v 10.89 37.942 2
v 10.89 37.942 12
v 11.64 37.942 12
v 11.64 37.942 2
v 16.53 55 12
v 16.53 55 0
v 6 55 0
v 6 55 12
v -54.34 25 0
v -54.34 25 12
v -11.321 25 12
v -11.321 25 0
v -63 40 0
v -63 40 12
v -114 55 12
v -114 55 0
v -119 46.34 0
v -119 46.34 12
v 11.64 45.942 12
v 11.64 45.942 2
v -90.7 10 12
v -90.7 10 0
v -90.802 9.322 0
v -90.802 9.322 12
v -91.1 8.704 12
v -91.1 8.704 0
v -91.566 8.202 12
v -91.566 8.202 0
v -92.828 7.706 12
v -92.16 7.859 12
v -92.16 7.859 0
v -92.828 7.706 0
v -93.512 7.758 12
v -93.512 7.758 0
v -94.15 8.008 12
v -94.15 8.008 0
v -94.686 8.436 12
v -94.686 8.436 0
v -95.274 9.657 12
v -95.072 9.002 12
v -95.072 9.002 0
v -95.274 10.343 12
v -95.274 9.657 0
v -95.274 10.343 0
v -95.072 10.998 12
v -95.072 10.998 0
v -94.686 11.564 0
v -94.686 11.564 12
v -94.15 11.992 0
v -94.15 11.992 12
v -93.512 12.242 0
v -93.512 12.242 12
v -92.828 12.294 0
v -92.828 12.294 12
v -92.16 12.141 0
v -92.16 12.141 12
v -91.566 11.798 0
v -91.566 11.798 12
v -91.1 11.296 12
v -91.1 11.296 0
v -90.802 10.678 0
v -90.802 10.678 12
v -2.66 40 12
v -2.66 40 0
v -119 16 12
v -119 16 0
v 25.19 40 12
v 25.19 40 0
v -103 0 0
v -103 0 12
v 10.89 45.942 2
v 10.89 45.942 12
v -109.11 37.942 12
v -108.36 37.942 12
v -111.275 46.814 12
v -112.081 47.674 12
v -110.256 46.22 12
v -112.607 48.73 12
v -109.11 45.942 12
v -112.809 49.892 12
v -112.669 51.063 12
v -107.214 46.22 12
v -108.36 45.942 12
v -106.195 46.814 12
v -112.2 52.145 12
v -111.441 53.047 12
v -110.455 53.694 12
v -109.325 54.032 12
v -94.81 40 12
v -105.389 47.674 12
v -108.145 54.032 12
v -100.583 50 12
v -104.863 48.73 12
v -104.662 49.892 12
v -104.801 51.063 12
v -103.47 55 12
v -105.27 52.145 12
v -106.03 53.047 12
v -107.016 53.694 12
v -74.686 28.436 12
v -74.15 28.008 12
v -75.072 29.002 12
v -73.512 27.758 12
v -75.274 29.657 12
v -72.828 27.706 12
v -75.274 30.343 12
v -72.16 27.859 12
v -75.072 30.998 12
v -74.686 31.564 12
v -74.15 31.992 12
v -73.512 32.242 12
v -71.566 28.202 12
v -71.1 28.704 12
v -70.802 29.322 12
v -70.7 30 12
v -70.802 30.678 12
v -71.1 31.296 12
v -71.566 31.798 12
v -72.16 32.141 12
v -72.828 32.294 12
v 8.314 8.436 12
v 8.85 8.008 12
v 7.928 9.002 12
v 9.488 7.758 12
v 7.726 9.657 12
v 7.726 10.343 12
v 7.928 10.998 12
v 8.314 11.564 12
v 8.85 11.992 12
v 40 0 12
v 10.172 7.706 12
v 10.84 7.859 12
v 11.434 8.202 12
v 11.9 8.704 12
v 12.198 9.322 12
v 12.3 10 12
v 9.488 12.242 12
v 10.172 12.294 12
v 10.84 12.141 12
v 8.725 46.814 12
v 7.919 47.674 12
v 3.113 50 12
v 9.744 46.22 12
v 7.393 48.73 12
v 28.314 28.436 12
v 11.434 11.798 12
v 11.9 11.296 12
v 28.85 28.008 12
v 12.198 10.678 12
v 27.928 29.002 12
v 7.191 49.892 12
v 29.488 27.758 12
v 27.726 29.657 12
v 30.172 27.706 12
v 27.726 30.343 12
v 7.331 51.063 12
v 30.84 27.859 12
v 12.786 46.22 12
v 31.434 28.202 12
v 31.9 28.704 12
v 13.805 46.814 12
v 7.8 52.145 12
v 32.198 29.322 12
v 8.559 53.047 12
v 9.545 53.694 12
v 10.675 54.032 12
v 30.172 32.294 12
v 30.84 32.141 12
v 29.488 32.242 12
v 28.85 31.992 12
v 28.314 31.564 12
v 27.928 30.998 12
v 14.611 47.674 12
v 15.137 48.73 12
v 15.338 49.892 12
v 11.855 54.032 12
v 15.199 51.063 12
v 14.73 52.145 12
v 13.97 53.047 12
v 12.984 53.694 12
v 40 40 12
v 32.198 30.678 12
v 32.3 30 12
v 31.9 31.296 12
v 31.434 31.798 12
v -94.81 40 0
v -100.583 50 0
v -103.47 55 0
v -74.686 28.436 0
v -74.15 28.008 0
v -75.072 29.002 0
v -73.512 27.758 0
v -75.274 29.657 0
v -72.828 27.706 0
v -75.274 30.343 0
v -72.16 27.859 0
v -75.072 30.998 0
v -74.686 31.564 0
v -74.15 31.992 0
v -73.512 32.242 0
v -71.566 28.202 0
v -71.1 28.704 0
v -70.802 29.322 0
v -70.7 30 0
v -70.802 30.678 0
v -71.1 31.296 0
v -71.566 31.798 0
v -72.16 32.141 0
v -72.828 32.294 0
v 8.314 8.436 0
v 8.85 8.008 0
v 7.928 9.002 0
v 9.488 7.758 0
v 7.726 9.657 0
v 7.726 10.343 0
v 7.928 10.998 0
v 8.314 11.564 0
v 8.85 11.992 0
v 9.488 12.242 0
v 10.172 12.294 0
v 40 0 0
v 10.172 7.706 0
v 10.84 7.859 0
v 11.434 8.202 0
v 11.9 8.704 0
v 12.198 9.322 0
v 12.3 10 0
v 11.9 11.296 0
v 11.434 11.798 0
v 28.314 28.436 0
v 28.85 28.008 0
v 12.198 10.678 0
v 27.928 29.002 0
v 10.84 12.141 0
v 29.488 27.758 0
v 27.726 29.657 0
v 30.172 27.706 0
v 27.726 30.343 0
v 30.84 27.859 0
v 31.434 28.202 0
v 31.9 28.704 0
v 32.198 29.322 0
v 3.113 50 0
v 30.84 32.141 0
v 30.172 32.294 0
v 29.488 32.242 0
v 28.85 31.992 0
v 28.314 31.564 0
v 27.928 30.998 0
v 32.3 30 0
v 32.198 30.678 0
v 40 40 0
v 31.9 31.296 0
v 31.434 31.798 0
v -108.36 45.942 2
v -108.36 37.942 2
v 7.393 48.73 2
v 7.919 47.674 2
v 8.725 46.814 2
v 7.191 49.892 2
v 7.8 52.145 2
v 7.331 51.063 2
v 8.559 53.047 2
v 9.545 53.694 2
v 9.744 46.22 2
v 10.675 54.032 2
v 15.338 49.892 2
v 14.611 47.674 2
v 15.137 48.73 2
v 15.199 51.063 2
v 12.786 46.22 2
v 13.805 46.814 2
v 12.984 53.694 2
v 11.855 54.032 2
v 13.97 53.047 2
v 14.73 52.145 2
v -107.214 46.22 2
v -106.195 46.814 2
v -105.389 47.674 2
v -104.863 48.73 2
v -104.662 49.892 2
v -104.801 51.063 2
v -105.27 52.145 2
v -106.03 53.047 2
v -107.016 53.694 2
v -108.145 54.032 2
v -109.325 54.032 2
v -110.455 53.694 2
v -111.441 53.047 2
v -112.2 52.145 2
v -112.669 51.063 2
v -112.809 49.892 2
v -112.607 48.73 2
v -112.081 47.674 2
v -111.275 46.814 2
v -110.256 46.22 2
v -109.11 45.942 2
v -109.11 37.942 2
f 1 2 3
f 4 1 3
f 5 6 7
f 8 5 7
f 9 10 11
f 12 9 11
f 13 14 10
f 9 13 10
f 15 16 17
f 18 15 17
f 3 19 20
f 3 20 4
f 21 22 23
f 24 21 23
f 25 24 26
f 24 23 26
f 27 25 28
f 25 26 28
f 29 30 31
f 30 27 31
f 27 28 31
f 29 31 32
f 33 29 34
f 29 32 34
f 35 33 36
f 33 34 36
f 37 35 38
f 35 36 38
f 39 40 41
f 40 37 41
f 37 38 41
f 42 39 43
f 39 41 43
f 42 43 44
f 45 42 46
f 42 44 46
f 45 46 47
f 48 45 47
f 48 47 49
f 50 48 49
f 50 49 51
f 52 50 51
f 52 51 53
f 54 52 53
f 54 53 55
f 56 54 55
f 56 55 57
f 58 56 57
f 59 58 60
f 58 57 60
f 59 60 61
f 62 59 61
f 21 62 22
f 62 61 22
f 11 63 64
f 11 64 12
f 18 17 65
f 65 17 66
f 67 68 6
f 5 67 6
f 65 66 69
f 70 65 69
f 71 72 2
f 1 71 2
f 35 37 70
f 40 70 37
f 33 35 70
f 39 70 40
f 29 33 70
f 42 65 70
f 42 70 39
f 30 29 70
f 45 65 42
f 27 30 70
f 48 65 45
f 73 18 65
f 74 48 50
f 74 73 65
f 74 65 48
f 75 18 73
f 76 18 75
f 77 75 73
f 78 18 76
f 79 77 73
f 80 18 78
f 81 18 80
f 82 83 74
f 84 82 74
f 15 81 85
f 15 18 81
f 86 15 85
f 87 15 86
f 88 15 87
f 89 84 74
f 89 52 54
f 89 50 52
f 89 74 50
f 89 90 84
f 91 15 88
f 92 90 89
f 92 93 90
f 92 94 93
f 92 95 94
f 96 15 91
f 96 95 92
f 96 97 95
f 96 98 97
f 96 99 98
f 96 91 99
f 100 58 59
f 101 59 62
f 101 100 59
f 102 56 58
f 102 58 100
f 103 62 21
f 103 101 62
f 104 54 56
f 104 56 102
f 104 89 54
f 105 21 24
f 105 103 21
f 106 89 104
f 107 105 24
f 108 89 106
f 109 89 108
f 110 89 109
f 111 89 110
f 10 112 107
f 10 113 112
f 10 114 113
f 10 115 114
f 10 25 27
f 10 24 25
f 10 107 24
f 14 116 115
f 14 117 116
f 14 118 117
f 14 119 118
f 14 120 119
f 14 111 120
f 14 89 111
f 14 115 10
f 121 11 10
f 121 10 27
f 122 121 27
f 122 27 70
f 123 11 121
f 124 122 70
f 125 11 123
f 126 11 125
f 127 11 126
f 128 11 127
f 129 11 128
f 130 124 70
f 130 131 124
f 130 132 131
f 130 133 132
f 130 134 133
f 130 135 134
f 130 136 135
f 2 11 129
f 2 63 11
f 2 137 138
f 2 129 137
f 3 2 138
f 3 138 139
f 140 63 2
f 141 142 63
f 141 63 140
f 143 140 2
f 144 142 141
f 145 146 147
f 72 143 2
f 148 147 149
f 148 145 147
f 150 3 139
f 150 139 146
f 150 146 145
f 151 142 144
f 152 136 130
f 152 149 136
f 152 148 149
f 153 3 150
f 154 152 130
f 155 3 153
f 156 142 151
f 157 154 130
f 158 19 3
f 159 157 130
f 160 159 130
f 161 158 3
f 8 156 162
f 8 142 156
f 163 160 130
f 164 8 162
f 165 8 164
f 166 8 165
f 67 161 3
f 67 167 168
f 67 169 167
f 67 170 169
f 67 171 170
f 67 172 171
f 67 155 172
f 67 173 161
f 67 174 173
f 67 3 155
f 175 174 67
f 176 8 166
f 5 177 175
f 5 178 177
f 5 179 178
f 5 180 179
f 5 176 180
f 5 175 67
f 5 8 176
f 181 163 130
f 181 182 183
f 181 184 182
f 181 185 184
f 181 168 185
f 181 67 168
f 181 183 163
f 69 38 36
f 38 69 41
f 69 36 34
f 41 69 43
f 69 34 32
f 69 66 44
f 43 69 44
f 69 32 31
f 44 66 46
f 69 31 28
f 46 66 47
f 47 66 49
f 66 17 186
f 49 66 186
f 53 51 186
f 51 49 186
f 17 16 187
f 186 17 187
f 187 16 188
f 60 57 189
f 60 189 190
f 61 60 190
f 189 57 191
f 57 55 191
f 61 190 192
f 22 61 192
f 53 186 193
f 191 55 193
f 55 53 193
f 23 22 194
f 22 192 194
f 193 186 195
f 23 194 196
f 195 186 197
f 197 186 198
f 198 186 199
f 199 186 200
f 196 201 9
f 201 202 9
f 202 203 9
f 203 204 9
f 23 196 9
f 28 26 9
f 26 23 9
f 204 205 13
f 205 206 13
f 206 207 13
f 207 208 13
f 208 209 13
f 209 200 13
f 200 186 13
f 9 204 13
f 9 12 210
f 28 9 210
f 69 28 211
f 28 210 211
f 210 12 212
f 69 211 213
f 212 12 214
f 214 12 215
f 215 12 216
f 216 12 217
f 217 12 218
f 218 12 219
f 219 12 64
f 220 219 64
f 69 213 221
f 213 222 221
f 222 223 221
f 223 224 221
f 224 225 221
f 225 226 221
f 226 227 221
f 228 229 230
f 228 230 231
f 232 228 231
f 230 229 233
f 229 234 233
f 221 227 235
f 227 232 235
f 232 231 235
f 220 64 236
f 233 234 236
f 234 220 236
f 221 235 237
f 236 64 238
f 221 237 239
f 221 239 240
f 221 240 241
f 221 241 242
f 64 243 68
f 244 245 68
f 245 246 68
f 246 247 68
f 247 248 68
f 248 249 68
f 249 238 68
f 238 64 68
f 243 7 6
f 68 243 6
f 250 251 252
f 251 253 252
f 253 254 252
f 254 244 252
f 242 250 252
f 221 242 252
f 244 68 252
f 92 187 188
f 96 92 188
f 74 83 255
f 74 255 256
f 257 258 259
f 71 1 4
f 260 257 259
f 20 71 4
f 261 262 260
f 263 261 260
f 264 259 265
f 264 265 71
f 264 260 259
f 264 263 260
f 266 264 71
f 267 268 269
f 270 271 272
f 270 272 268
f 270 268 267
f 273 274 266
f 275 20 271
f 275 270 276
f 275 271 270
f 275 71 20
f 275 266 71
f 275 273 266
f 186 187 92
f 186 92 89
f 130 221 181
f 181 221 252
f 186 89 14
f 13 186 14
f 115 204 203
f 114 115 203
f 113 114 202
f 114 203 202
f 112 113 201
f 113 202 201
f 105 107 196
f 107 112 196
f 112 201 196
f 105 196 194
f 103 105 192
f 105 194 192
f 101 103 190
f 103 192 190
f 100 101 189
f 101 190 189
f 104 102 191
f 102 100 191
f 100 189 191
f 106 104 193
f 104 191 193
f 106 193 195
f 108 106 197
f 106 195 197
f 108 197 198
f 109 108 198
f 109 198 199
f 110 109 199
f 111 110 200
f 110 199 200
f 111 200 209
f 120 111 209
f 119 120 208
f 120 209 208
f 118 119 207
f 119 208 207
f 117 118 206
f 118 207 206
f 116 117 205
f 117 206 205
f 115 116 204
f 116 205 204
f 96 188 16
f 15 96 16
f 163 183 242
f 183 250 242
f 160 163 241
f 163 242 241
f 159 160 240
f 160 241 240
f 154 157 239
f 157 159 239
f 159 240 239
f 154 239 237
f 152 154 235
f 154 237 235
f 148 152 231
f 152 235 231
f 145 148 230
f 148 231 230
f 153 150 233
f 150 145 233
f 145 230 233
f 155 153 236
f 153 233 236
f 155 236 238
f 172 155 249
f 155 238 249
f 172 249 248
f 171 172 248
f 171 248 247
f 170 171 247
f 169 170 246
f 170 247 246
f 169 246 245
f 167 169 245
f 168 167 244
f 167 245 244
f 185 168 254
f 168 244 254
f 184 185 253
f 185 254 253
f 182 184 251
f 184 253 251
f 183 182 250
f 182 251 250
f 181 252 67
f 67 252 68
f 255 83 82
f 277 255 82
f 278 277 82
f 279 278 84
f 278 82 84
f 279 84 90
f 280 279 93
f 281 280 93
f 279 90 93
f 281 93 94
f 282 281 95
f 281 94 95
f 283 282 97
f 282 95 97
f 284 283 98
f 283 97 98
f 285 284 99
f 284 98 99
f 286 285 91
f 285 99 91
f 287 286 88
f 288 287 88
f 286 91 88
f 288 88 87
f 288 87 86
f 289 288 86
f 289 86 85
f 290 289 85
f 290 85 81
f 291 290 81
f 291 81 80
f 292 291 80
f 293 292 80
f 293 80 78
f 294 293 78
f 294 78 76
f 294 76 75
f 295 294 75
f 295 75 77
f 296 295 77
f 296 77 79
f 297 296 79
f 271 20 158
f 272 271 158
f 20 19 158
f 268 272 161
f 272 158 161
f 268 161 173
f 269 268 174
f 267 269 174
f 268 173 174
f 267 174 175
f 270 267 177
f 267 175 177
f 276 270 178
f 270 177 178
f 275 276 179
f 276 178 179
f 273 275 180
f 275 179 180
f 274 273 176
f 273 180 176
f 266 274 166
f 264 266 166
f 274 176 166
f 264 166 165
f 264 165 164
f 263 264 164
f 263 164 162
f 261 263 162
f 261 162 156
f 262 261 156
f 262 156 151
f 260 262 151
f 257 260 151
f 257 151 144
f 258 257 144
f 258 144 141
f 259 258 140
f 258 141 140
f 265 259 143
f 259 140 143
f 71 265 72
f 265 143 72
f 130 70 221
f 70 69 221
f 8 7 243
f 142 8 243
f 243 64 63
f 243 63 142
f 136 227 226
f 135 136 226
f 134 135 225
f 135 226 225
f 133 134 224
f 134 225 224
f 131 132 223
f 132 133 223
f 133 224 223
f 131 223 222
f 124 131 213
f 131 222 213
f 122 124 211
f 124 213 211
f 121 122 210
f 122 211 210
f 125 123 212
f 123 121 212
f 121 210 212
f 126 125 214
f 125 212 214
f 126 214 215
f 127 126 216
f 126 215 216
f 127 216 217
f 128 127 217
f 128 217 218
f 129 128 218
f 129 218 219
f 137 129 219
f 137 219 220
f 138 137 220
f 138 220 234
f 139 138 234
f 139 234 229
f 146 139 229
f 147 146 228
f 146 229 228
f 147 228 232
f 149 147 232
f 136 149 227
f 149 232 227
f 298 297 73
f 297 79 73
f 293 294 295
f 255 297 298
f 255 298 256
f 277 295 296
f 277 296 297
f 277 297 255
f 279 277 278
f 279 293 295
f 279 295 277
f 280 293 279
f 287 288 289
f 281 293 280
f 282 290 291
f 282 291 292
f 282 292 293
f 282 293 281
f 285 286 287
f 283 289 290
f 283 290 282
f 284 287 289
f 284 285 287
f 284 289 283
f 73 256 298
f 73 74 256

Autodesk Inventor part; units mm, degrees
ref_plane "YZ Plane" through (0, 0, 0) normal (1, 0, 0) x (0, 1, 0)
ref_plane "XZ Plane" through (0, 0, 0) normal (0, 1, 0) x (-1, 0, 0)
ref_plane "XY Plane" through (0, 0, 0) normal (0, 0, 1) x (1, 0, 0)
sketch "rail_profile_1" plane through (0, 0, 0) normal (0, 0, 1) x (1, 0, 0)
  line L0 (6.605, 1.8) -> (6.605, 1.185) construction
  line L1 (7.1607, 6.1) -> (4.5, 3.4393) construction
  line L2 (4.5, 1.8) -> (6.605, 1.8) construction
  line L3 (4.5, 3.4393) -> (4.5, 1.8) construction
  line L4 (6.605, 1.185) -> (5.42, 0) construction
  line L5 (3.4393, 4.5) -> (6.1, 7.1607) construction
  line L6 (1.8, 4.5) -> (3.4393, 4.5) construction
  line L7 (1.8, 6.605) -> (1.8, 4.5) construction
  line L8 (5.42, 0) -> (1.5, 0) construction
  arc A0 (0, 1.5) -> (1.5, 0) centre (1.5, 1.5) ccw construction
  line L9 (0, 1.5) -> (0, 5.42) construction
  line L10 (0, 5.42) -> (1.185, 6.605) construction
  line L11 (1.185, 6.605) -> (1.8, 6.605) construction
  line L12 (0, 1.5) -> (0, 0) construction
  line L13 (0, 0) -> (1.5, 0) construction
  line L14 (3.7607, 17.3) -> (7.1607, 13.9) construction
  line L15 (1.8, 17.3) -> (3.7607, 17.3) construction
  line L16 (1.8, 22.7) -> (1.8, 17.3) construction
  line L17 (3.4393, 15.5) -> (1.8, 15.5) construction
  line L18 (1.8, 15.5) -> (1.8, 13.395) construction
  line L19 (1.8, 13.395) -> (1.185, 13.395) construction
  line L20 (6.1, 12.8393) -> (3.4393, 15.5) construction
  line L21 (1.185, 13.395) -> (0, 14.58) construction
  line L22 (0, 14.58) -> (0, 25.42) construction
  line L23 (6.1, 7.1607) -> (6.1, 9.79) construction
  line L24 (9.79, 6.1) -> (7.1607, 6.1) construction
  line L25 (6.1, 9.79) -> (6.31, 10) construction
  line L26 (10, 6.31) -> (9.79, 6.1) construction
  line L27 (6.31, 10) -> (6.1, 10.21) construction
  line L28 (10.21, 6.1) -> (10, 6.31) construction
  line L29 (6.1, 10.21) -> (6.1, 12.8393) construction
  circle A1 centre (10, 10) radius 2.3 construction
  line L30 (7.1607, 13.9) -> (12.8393, 13.9) construction
  line L31 (12.8393, 13.9) -> (13.9, 12.8393) construction
  line L32 (13.9, 12.8393) -> (13.9, 7.1607) construction
  line L33 (12.8393, 6.1) -> (10.21, 6.1) construction
  line L34 (17.3, 1.8) -> (22.7, 1.8) construction
  line L35 (17.3, 3.7607) -> (17.3, 1.8) construction
  line L36 (13.9, 7.1607) -> (17.3, 3.7607) construction
  line L37 (13.395, 1.185) -> (13.395, 1.8) construction
  line L38 (14.58, 0) -> (13.395, 1.185) construction
  line L39 (15.5, 3.4393) -> (12.8393, 6.1) construction
  line L40 (13.395, 1.8) -> (15.5, 1.8) construction
  line L41 (25.42, 0) -> (14.58, 0) construction
  line L42 (15.5, 1.8) -> (15.5, 3.4393) construction
  line L43 (0, 20) -> (51.5435, 20) construction
  line L44 (20, 0) -> (20, 50.2619) construction
  line L45 (33.395, 1.8) -> (33.395, 1.185) construction
  line L46 (32.8393, 6.1) -> (35.5, 3.4393) construction
  line L47 (35.5, 1.8) -> (33.395, 1.8) construction
  line L48 (35.5, 3.4393) -> (35.5, 1.8) construction
  line L49 (33.395, 1.185) -> (34.58, 0) construction
  line L50 (36.5607, 4.5) -> (33.9, 7.1607) construction
  line L51 (38.2, 4.5) -> (36.5607, 4.5) construction
  line L52 (38.2, 6.605) -> (38.2, 4.5) construction
  line L53 (34.58, 0) -> (38.5, 0) construction
  arc A2 (38.5, 0) -> (40, 1.5) centre (38.5, 1.5) ccw construction
  line L54 (40, 1.5) -> (40, 5.42) construction
  line L55 (38.815, 6.605) -> (38.2, 6.605) construction
  line L56 (40, 5.42) -> (38.815, 6.605) construction
  line L57 (33.9, 7.1607) -> (33.9, 9.79) construction
  line L58 (30.21, 6.1) -> (32.8393, 6.1) construction
  line L59 (33.9, 9.79) -> (33.69, 10) construction
  line L60 (30, 6.31) -> (30.21, 6.1) construction
  line L61 (33.69, 10) -> (33.9, 10.21) construction
  line L62 (29.79, 6.1) -> (30, 6.31) construction
  line L63 (33.9, 10.21) -> (33.9, 12.8393) construction
  line L64 (27.1607, 6.1) -> (29.79, 6.1) construction
  line L65 (26.1, 12.8393) -> (26.1, 7.1607) construction
  line L66 (32.8393, 13.9) -> (27.1607, 13.9) construction
  line L67 (27.1607, 13.9) -> (26.1, 12.8393) construction
  circle A3 centre (30, 10) radius 2.3 construction
  line L68 (38.2, 17.3) -> (36.2393, 17.3) construction
  line L69 (38.2, 22.7) -> (38.2, 17.3) construction
  line L70 (40, 14.58) -> (40, 25.42) construction
  line L71 (36.5607, 15.5) -> (38.2, 15.5) construction
  line L72 (38.2, 15.5) -> (38.2, 13.395) construction
  line L73 (38.2, 13.395) -> (38.815, 13.395) construction
  line L74 (38.815, 13.395) -> (40, 14.58) construction
  line L75 (22.7, 3.7607) -> (22.7, 1.8) construction
  line L76 (24.5, 1.8) -> (24.5, 3.4393) construction
  line L77 (26.605, 1.8) -> (24.5, 1.8) construction
  line L78 (26.605, 1.185) -> (26.605, 1.8) construction
  line L79 (25.42, 0) -> (26.605, 1.185) construction
  line L80 (24.5, 3.4393) -> (27.1607, 6.1) construction
  line L81 (26.1, 7.1607) -> (22.7, 3.7607) construction
  line L82 (33.9, 12.8393) -> (36.5607, 15.5) construction
  line L83 (36.2393, 17.3) -> (32.8393, 13.9) construction
  line L84 (6.605, 38.2) -> (6.605, 38.815) construction
  line L85 (7.1607, 33.9) -> (4.5, 36.5607) construction
  line L86 (4.5, 38.2) -> (6.605, 38.2) construction
  line L87 (4.5, 36.5607) -> (4.5, 38.2) construction
  line L88 (6.605, 38.815) -> (5.42, 40) construction
  line L89 (3.4393, 35.5) -> (6.1, 32.8393) construction
  line L90 (1.8, 35.5) -> (3.4393, 35.5) construction
  line L91 (1.8, 33.395) -> (1.8, 35.5) construction
  line L92 (5.42, 40) -> (1.5, 40) construction
  arc A4 (1.5, 40) -> (0, 38.5) centre (1.5, 38.5) ccw construction
  line L93 (0, 38.5) -> (0, 34.58) construction
  line L94 (1.185, 33.395) -> (1.8, 33.395) construction
  line L95 (0, 34.58) -> (1.185, 33.395) construction
  line L96 (6.1, 32.8393) -> (6.1, 30.21) construction
  line L97 (9.79, 33.9) -> (7.1607, 33.9) construction
  line L98 (6.1, 30.21) -> (6.31, 30) construction
  line L99 (10, 33.69) -> (9.79, 33.9) construction
  line L100 (6.31, 30) -> (6.1, 29.79) construction
  line L101 (10.21, 33.9) -> (10, 33.69) construction
  line L102 (6.1, 29.79) -> (6.1, 27.1607) construction
  line L103 (12.8393, 33.9) -> (10.21, 33.9) construction
  line L104 (13.9, 27.1607) -> (13.9, 32.8393) construction
  line L105 (7.1607, 26.1) -> (12.8393, 26.1) construction
  line L106 (12.8393, 26.1) -> (13.9, 27.1607) construction
  circle A5 centre (10, 30) radius 2.3 construction
  line L107 (1.8, 22.7) -> (3.7607, 22.7) construction
  line L108 (3.4393, 24.5) -> (1.8, 24.5) construction
  line L109 (1.8, 24.5) -> (1.8, 26.605) construction
  line L110 (1.8, 26.605) -> (1.185, 26.605) construction
  line L111 (1.185, 26.605) -> (0, 25.42) construction
  line L112 (17.3, 36.2393) -> (17.3, 38.2) construction
  line L113 (17.3, 38.2) -> (22.7, 38.2) construction
  line L114 (15.5, 38.2) -> (15.5, 36.5607) construction
  line L115 (13.395, 38.2) -> (15.5, 38.2) construction
  line L116 (13.395, 38.815) -> (13.395, 38.2) construction
  line L117 (14.58, 40) -> (13.395, 38.815) construction
  line L118 (25.42, 40) -> (14.58, 40) construction
  line L119 (15.5, 36.5607) -> (12.8393, 33.9) construction
  line L120 (13.9, 32.8393) -> (17.3, 36.2393) construction
  line L121 (6.1, 27.1607) -> (3.4393, 24.5) construction
  line L122 (3.7607, 22.7) -> (7.1607, 26.1) construction
  line L123 (38.815, 26.605) -> (40, 25.42) construction
  line L124 (38.2, 26.605) -> (38.815, 26.605) construction
  line L125 (38.2, 24.5) -> (38.2, 26.605) construction
  line L126 (38.2, 22.7) -> (36.2393, 22.7) construction
  line L127 (36.5607, 24.5) -> (38.2, 24.5) construction
  line L128 (36.2393, 22.7) -> (32.8393, 26.1) construction
  line L129 (33.9, 27.1607) -> (36.5607, 24.5) construction
  line L130 (32.8393, 26.1) -> (27.1607, 26.1) construction
  line L131 (27.1607, 26.1) -> (26.1, 27.1607) construction
  line L132 (26.1, 27.1607) -> (26.1, 32.8393) construction
  line L133 (26.1, 32.8393) -> (22.7, 36.2393) construction
  line L134 (24.5, 36.5607) -> (27.1607, 33.9) construction
  line L135 (24.5, 38.2) -> (24.5, 36.5607) construction
  line L136 (22.7, 36.2393) -> (22.7, 38.2) construction
  line L137 (26.605, 38.2) -> (24.5, 38.2) construction
  line L138 (26.605, 38.815) -> (26.605, 38.2) construction
  line L139 (25.42, 40) -> (26.605, 38.815) construction
  line L140 (33.395, 38.815) -> (34.58, 40) construction
  line L141 (34.58, 40) -> (38.5, 40) construction
  arc A6 (40, 38.5) -> (38.5, 40) centre (38.5, 38.5) ccw construction
  line L142 (40, 38.5) -> (40, 34.58) construction
  line L143 (40, 34.58) -> (38.815, 33.395) construction
  line L144 (38.815, 33.395) -> (38.2, 33.395) construction
  line L145 (38.2, 33.395) -> (38.2, 35.5) construction
  line L146 (38.2, 35.5) -> (36.5607, 35.5) construction
  line L147 (36.5607, 35.5) -> (33.9, 32.8393) construction
  line L148 (32.8393, 33.9) -> (35.5, 36.5607) construction
  line L149 (35.5, 36.5607) -> (35.5, 38.2) construction
  line L150 (35.5, 38.2) -> (33.395, 38.2) construction
  line L151 (33.395, 38.2) -> (33.395, 38.815) construction
  line L152 (30.21, 33.9) -> (32.8393, 33.9) construction
  line L153 (27.1607, 33.9) -> (29.79, 33.9) construction
  line L154 (30, 33.69) -> (30.21, 33.9) construction
  line L155 (29.79, 33.9) -> (30, 33.69) construction
  circle A7 centre (30, 30) radius 2.3 construction
  line L156 (33.9, 32.8393) -> (33.9, 30.21) construction
  line L157 (33.9, 30.21) -> (33.69, 30) construction
  line L158 (33.69, 30) -> (33.9, 29.79) construction
  line L159 (33.9, 29.79) -> (33.9, 27.1607) construction
  point P0 (0, 0)
  dimension "d0" = 1.5
  dimension "d1" = 6.605
  dimension "d2" = 6.605
  dimension "d3" = 1.185
  dimension "d4" = 135
  dimension "d5" = 1.185
  dimension "d6" = 135
  dimension "d7" = 0.615
  dimension "d8" = 0.615
  dimension "d9" = 2.105
  dimension "d10" = 1.6393
  dimension "d11" = 135
  dimension "d12" = 135
  dimension "d13" = 2.6607
  dimension "d14" = 1.6393
  dimension "d15" = 2.105
  dimension "d16" = 4.6
  dimension "d17" = 10
  dimension "d18" = 10
  dimension "d19" = 13.395
  dimension "d20" = 1.8
  dimension "d21" = 135
  dimension "d22" = 1.185
  dimension "d23" = 1.8
  dimension "d24" = 2.105
  dimension "d25" = 135
  dimension "d26" = 2.6607
  dimension "d29" = 7.1607
  dimension "d34" = 0.21
  dimension "d35" = 135
  dimension "d36" = 0.21
  dimension "d37" = 135
  dimension "d38" = 2.6293
  dimension "d39" = 3.4
  dimension "d40" = 1.5
  dimension "d41" = 135
  dimension "d42" = 0.21
  dimension "d43" = 0.21
  dimension "d44" = 135
  dimension "d45" = 2.6293
  dimension "d46" = 1.0607
  dimension "d47" = 135
  dimension "d48" = 5.6787
  dimension "d49" = 1.5
  dimension "d50" = 135
  dimension "d51" = 13.395
  dimension "d52" = 1.185
  dimension "d53" = 45
  dimension "d54" = 1.6393
  dimension "d55" = 1.9607
  dimension "d56" = 5.4
  dimension "d57" = 0.615
  dimension "d58" = 2.105
  dimension "d59" = 20
  dimension "d60" = 20
sketch "Sketch2" plane through (0, 0, 0) normal (0, 0, 1) x (1, 0, 0)
  line L0 (-14.2649, 439.4908) -> (-14.2649, -197.1126) construction
  line L1 (5.42, 40) -> (1.5, 40) construction
  line L2 (-119, 46.34) -> (-119, 16)
  line L3 (-114.0001, 55) -> (-119, 46.34)
  line L4 (-103.4701, 55) -> (-114.0001, 55)
  line L5 (-100.5834, 50) -> (-103.4701, 55)
  line L6 (3.1131, 50) -> (-100.5834, 50)
  line L7 (-119, 16) -> (-103, 0)
  line L8 (-103, 0) -> (40, 0)
  line L9 (5.9999, 55) -> (3.1131, 50)
  line L10 (16.5299, 55) -> (5.9999, 55)
  line L11 (25.1901, 40) -> (16.5299, 55)
  line L12 (40, 40) -> (25.1901, 40)
  line L13 (40, 0) -> (40, 40)
  circle A0 centre (-93, 10) radius 2.3
  circle A1 centre (-73, 30) radius 2.3
  line L14 (40, 14.58) -> (40, 25.42) construction
  circle A2 centre (10, 10) radius 2.3 projected
  circle A3 centre (30, 30) radius 2.3 projected
  line L15 (10, 10) -> (-93, 10) construction
  line L16 (25.42, 0) -> (14.58, 0) construction
  point P0 (0, 0)
  point P1 (0, 0)
  dimension "d219" = 20
  dimension "d220" = 20
  dimension "d221" = 120
  dimension "d222" = 83
  dimension "d223" = 60
  dimension "d224" = 60
  dimension "d225" = 120
  dimension "d226" = 10.53
  dimension "d227" = 10.53
  dimension "d228" = 4.0001
  dimension "d229" = 50
  dimension "d230" = 5
  dimension "d231" = 5
  dimension "d232" = 8.66
  dimension "d233" = 15
  dimension "d234" = 16
  dimension "d235" = 135
  dimension "d236" = 26
extrude "Base" add sketch "Sketch2" along normal blind 12
sketch "rail_profile_2" plane through (0, 0, 0) normal (0, 0, -1) x (-1, 0, 0)
  line L0 (-40, 38.5) -> (-40, 34.58) construction
  line L1 (-40, 34.58) -> (-38.815, 33.395) construction
  line L2 (0, 14.58) -> (0, 25.42) construction
  line L3 (69.605, 1.8) -> (69.605, 1.185) construction
  line L4 (70.1607, 6.1) -> (67.5, 3.4393) construction
  line L5 (67.5, 1.8) -> (69.605, 1.8) construction
  line L6 (67.5, 3.4393) -> (67.5, 1.8) construction
  line L7 (69.605, 1.185) -> (68.42, 0) construction
  line L8 (66.4393, 4.5) -> (69.1, 7.1607) construction
  line L9 (64.8, 4.5) -> (66.4393, 4.5) construction
  line L10 (64.8, 6.605) -> (64.8, 4.5) construction
  line L11 (68.42, 0) -> (64.5, 0) construction
  arc A0 (63, 1.5) -> (64.5, 0) centre (64.5, 1.5) ccw construction
  line L12 (63, 1.5) -> (63, 5.42) construction
  line L13 (64.185, 6.605) -> (64.8, 6.605) construction
  line L14 (63, 5.42) -> (64.185, 6.605) construction
  line L15 (63, 1.5) -> (63, 0) construction
  line L16 (63, 0) -> (64.5, 0) construction
  line L17 (69.1, 7.1607) -> (69.1, 9.79) construction
  line L18 (72.79, 6.1) -> (70.1607, 6.1) construction
  line L19 (69.1, 9.79) -> (69.31, 10) construction
  line L20 (73, 6.31) -> (72.79, 6.1) construction
  line L21 (69.31, 10) -> (69.1, 10.21) construction
  line L22 (73.21, 6.1) -> (73, 6.31) construction
  line L23 (69.1, 10.21) -> (69.1, 12.8393) construction
  line L24 (75.8393, 6.1) -> (73.21, 6.1) construction
  line L25 (76.9, 12.8393) -> (76.9, 7.1607) construction
  line L26 (70.1607, 13.9) -> (75.8393, 13.9) construction
  line L27 (75.8393, 13.9) -> (76.9, 12.8393) construction
  circle A1 centre (73, 10) radius 2.3 construction
  line L28 (64.8, 17.3) -> (66.7607, 17.3) construction
  line L29 (64.8, 22.7) -> (64.8, 17.3) construction
  line L30 (63, 14.58) -> (63, 25.42) construction
  line L31 (66.4393, 15.5) -> (64.8, 15.5) construction
  line L32 (64.8, 15.5) -> (64.8, 13.395) construction
  line L33 (64.8, 13.395) -> (64.185, 13.395) construction
  line L34 (64.185, 13.395) -> (63, 14.58) construction
  line L35 (80.3, 3.7607) -> (80.3, 1.8) construction
  line L36 (80.3, 1.8) -> (85.7, 1.8) construction
  line L37 (78.5, 1.8) -> (78.5, 3.4393) construction
  line L38 (76.395, 1.8) -> (78.5, 1.8) construction
  line L39 (76.395, 1.185) -> (76.395, 1.8) construction
  line L40 (77.58, 0) -> (76.395, 1.185) construction
  line L41 (88.42, 0) -> (77.58, 0) construction
  line L42 (78.5, 3.4393) -> (75.8393, 6.1) construction
  line L43 (76.9, 7.1607) -> (80.3, 3.7607) construction
  line L44 (69.1, 12.8393) -> (66.4393, 15.5) construction
  line L45 (66.7607, 17.3) -> (70.1607, 13.9) construction
  line L46 (63, 20) -> (44.0135, 20) construction
  line L47 (83, 0) -> (83, 50.2619) construction
  line L48 (103, 14.58) -> (103, 25.42) construction
  line L49 (101.815, 13.395) -> (103, 14.58) construction
  line L50 (101.2, 13.395) -> (101.815, 13.395) construction
  line L51 (101.2, 15.5) -> (101.2, 13.395) construction
  line L52 (101.2, 22.7) -> (101.2, 17.3) construction
  line L53 (101.2, 17.3) -> (99.2393, 17.3) construction
  line L54 (99.5607, 15.5) -> (101.2, 15.5) construction
  line L55 (99.2393, 17.3) -> (95.8393, 13.9) construction
  line L56 (96.9, 12.8393) -> (99.5607, 15.5) construction
  line L57 (95.8393, 13.9) -> (90.1607, 13.9) construction
  line L58 (90.1607, 13.9) -> (89.1, 12.8393) construction
  line L59 (89.1, 12.8393) -> (89.1, 7.1607) construction
  line L60 (89.1, 7.1607) -> (85.7, 3.7607) construction
  line L61 (87.5, 3.4393) -> (90.1607, 6.1) construction
  line L62 (87.5, 1.8) -> (87.5, 3.4393) construction
  line L63 (85.7, 3.7607) -> (85.7, 1.8) construction
  line L64 (89.605, 1.8) -> (87.5, 1.8) construction
  line L65 (89.605, 1.185) -> (89.605, 1.8) construction
  line L66 (88.42, 0) -> (89.605, 1.185) construction
  line L67 (96.395, 1.185) -> (97.58, 0) construction
  line L68 (97.58, 0) -> (101.5, 0) construction
  arc A2 (101.5, 0) -> (103, 1.5) centre (101.5, 1.5) ccw construction
  line L69 (103, 1.5) -> (103, 5.42) construction
  line L70 (103, 5.42) -> (101.815, 6.605) construction
  line L71 (101.815, 6.605) -> (101.2, 6.605) construction
  line L72 (101.2, 6.605) -> (101.2, 4.5) construction
  line L73 (101.2, 4.5) -> (99.5607, 4.5) construction
  line L74 (99.5607, 4.5) -> (96.9, 7.1607) construction
  line L75 (95.8393, 6.1) -> (98.5, 3.4393) construction
  line L76 (98.5, 3.4393) -> (98.5, 1.8) construction
  line L77 (98.5, 1.8) -> (96.395, 1.8) construction
  line L78 (96.395, 1.8) -> (96.395, 1.185) construction
  line L79 (93.21, 6.1) -> (95.8393, 6.1) construction
  line L80 (90.1607, 6.1) -> (92.79, 6.1) construction
  line L81 (93, 6.31) -> (93.21, 6.1) construction
  line L82 (92.79, 6.1) -> (93, 6.31) construction
  circle A3 centre (93, 10) radius 2.3 construction
  line L83 (96.9, 7.1607) -> (96.9, 9.79) construction
  line L84 (96.9, 9.79) -> (96.69, 10) construction
  line L85 (96.69, 10) -> (96.9, 10.21) construction
  line L86 (96.9, 10.21) -> (96.9, 12.8393) construction
  arc A4 (64.5, 40) -> (63, 38.5) centre (64.5, 38.5) ccw construction
  line L87 (68.42, 40) -> (64.5, 40) construction
  line L88 (69.605, 38.815) -> (68.42, 40) construction
  line L89 (69.605, 38.2) -> (69.605, 38.815) construction
  line L90 (67.5, 38.2) -> (69.605, 38.2) construction
  line L91 (67.5, 36.5607) -> (67.5, 38.2) construction
  line L92 (63, 38.5) -> (63, 34.58) construction
  line L93 (63, 34.58) -> (64.185, 33.395) construction
  line L94 (64.185, 33.395) -> (64.8, 33.395) construction
  line L95 (64.8, 33.395) -> (64.8, 35.5) construction
  line L96 (64.8, 35.5) -> (66.4393, 35.5) construction
  line L97 (66.4393, 35.5) -> (69.1, 32.8393) construction
  line L98 (70.1607, 33.9) -> (67.5, 36.5607) construction
  line L99 (72.79, 33.9) -> (70.1607, 33.9) construction
  line L100 (69.1, 32.8393) -> (69.1, 30.21) construction
  line L101 (73, 33.69) -> (72.79, 33.9) construction
  line L102 (73.21, 33.9) -> (73, 33.69) construction
  line L103 (75.8393, 33.9) -> (73.21, 33.9) construction
  circle A5 centre (73, 30) radius 2.3 construction
  line L104 (78.5, 36.5607) -> (75.8393, 33.9) construction
  line L105 (78.5, 38.2) -> (78.5, 36.5607) construction
  line L106 (76.395, 38.2) -> (78.5, 38.2) construction
  line L107 (76.395, 38.815) -> (76.395, 38.2) construction
  line L108 (77.58, 40) -> (76.395, 38.815) construction
  line L109 (88.42, 40) -> (77.58, 40) construction
  line L110 (80.3, 36.2393) -> (80.3, 38.2) construction
  line L111 (76.9, 32.8393) -> (80.3, 36.2393) construction
  line L112 (80.3, 38.2) -> (85.7, 38.2) construction
  line L113 (88.42, 40) -> (89.605, 38.815) construction
  line L114 (89.605, 38.815) -> (89.605, 38.2) construction
  line L115 (89.605, 38.2) -> (87.5, 38.2) construction
  line L116 (87.5, 38.2) -> (87.5, 36.5607) construction
  line L117 (85.7, 36.2393) -> (85.7, 38.2) construction
  line L118 (89.1, 32.8393) -> (85.7, 36.2393) construction
  line L119 (87.5, 36.5607) -> (90.1607, 33.9) construction
  line L120 (76.9, 27.1607) -> (76.9, 32.8393) construction
  line L121 (75.8393, 26.1) -> (76.9, 27.1607) construction
  line L122 (70.1607, 26.1) -> (75.8393, 26.1) construction
  line L123 (66.7607, 22.7) -> (70.1607, 26.1) construction
  line L124 (69.1, 29.79) -> (69.1, 27.1607) construction
  line L125 (69.1, 30.21) -> (69.31, 30) construction
  line L126 (69.31, 30) -> (69.1, 29.79) construction
  line L127 (66.4393, 24.5) -> (64.8, 24.5) construction
  line L128 (69.1, 27.1607) -> (66.4393, 24.5) construction
  line L129 (64.8, 22.7) -> (66.7607, 22.7) construction
  line L130 (64.8, 24.5) -> (64.8, 26.605) construction
  line L131 (64.8, 26.605) -> (64.185, 26.605) construction
  line L132 (64.185, 26.605) -> (63, 25.42) construction
  line L133 (90.1607, 33.9) -> (92.79, 33.9) construction
  line L134 (89.1, 27.1607) -> (89.1, 32.8393) construction
  line L135 (90.1607, 26.1) -> (89.1, 27.1607) construction
  line L136 (95.8393, 26.1) -> (90.1607, 26.1) construction
  line L137 (96.9, 29.79) -> (96.9, 27.1607) construction
  line L138 (99.2393, 22.7) -> (95.8393, 26.1) construction
  line L139 (99.5607, 24.5) -> (101.2, 24.5) construction
  line L140 (101.2, 22.7) -> (99.2393, 22.7) construction
  line L141 (96.9, 27.1607) -> (99.5607, 24.5) construction
  line L142 (101.2, 24.5) -> (101.2, 26.605) construction
  line L143 (101.2, 26.605) -> (101.815, 26.605) construction
  line L144 (101.815, 26.605) -> (103, 25.42) construction
  line L145 (103, 34.58) -> (101.815, 33.395) construction
  line L146 (103, 38.5) -> (103, 34.58) construction
  arc A6 (103, 38.5) -> (101.5, 40) centre (101.5, 38.5) ccw construction
  line L147 (97.58, 40) -> (101.5, 40) construction
  line L148 (96.395, 38.815) -> (97.58, 40) construction
  line L149 (96.395, 38.2) -> (96.395, 38.815) construction
  line L150 (98.5, 38.2) -> (96.395, 38.2) construction
  line L151 (93.21, 33.9) -> (95.8393, 33.9) construction
  line L152 (95.8393, 33.9) -> (98.5, 36.5607) construction
  line L153 (98.5, 36.5607) -> (98.5, 38.2) construction
  line L154 (99.5607, 35.5) -> (96.9, 32.8393) construction
  line L155 (96.9, 32.8393) -> (96.9, 30.21) construction
  line L156 (101.2, 35.5) -> (99.5607, 35.5) construction
  line L157 (101.2, 33.395) -> (101.2, 35.5) construction
  line L158 (101.815, 33.395) -> (101.2, 33.395) construction
  line L159 (96.9, 30.21) -> (96.69, 30) construction
  line L160 (96.69, 30) -> (96.9, 29.79) construction
  line L161 (93, 33.69) -> (93.21, 33.9) construction
  line L162 (92.79, 33.9) -> (93, 33.69) construction
  circle A7 centre (93, 30) radius 2.3 construction
  circle A8 centre (73, 30) radius 2.3 projected
  point P0 (0, 0)
  point P1 (93.2635, 30)
  dimension "d89" = 1.5
  dimension "d90" = 6.605
  dimension "d91" = 6.605
  dimension "d92" = 1.185
  dimension "d93" = 135
  dimension "d94" = 1.185
  dimension "d95" = 135
  dimension "d96" = 0.615
  dimension "d97" = 0.615
  dimension "d98" = 2.105
  dimension "d99" = 1.6393
  dimension "d100" = 135
  dimension "d101" = 135
  dimension "d102" = 2.6607
  dimension "d103" = 1.6393
  dimension "d104" = 2.105
  dimension "d105" = 4.6
  dimension "d106" = 10
  dimension "d107" = 10
  dimension "d108" = 13.395
  dimension "d109" = 1.8
  dimension "d110" = 135
  dimension "d111" = 1.185
  dimension "d112" = 1.8
  dimension "d113" = 2.105
  dimension "d114" = 135
  dimension "d115" = 2.6607
  dimension "d116" = 7.1607
  dimension "d117" = 0.21
  dimension "d118" = 135
  dimension "d119" = 0.21
  dimension "d120" = 135
  dimension "d121" = 2.6293
  dimension "d122" = 3.4
  dimension "d123" = 1.5
  dimension "d124" = 135
  dimension "d125" = 0.21
  dimension "d126" = 0.21
  dimension "d127" = 135
  dimension "d128" = 2.6293
  dimension "d129" = 1.0607
  dimension "d130" = 135
  dimension "d131" = 5.6787
  dimension "d132" = 1.5
  dimension "d133" = 135
  dimension "d134" = 13.395
  dimension "d135" = 1.185
  dimension "d136" = 45
  dimension "d137" = 1.6393
  dimension "d138" = 1.9607
  dimension "d139" = 5.4
  dimension "d140" = 0.615
  dimension "d141" = 2.105
  dimension "d142" = 20
  dimension "d143" = 20
sketch "Sketch3" plane through (0, 0, 12) normal (0, 0, 1) x (1, 0, 0)
  arc A0 (11.6399, 45.9423) -> (10.8899, 45.9423) centre (11.2649, 50) ccw
  line L0 (11.2649, 55) -> (11.2649, 50) construction
  line L1 (10.8899, 45.9423) -> (10.8899, 37.9423)
  line L2 (11.6399, 45.9423) -> (11.6399, 37.9423)
  line L3 (10.8899, 37.9423) -> (11.6399, 37.9423)
  line L4 (-48.7351, 50) -> (-48.7351, 99.3964) construction
  arc A1 (-108.3601, 45.9423) -> (-109.1101, 45.9423) centre (-108.7351, 50) ccw
  line L5 (-108.3601, 45.9423) -> (-108.3601, 37.9423)
  line L6 (-109.1101, 45.9423) -> (-109.1101, 37.9423)
  line L7 (-108.3601, 37.9423) -> (-109.1101, 37.9423)
  line L8 (16.5299, 55) -> (5.9999, 55) construction
  line L9 (11.2649, 55) -> (11.2649, 50) construction
  point P0 (0, 0)
  dimension "d83" = 5
  dimension "d84" = 8.15
  dimension "d85" = 8
  dimension "d86" = 0.75
  dimension "d237" = 120
extrude "rod_holes" cut sketch "Sketch3" against normal blind 10
ref_plane "Work Plane2" through (-35, 0, 12) normal (1, 0, 0) x (0, 0, -1)
ref_plane "Work Plane1" through (40, 0, 12) normal (1, 0, 0) x (0, 0, -1)
sketch "Sketch14" plane through (0, 0, 12) normal (0, 0, 1) x (1, 0, 0)
  line L0 (3.1131, 50) -> (-100.5834, 50) projected
  line L1 (-100.5834, 50) -> (-94.8099, 40)
  line L2 (-94.8099, 40) -> (-2.6604, 40)
  line L3 (-2.6604, 40) -> (3.1131, 50)
  line L4 (5.9999, 55) -> (3.1131, 50) projected
  line L5 (-100.5834, 50) -> (-103.4701, 55) projected
  line L6 (-103, 0) -> (40, 0) projected
  line L7 (-63, 40) -> (-54.3397, 25)
  line L8 (-54.3397, 25) -> (-11.3207, 25)
  circle A0 centre (-73, 30) radius 2.3 projected
  line L9 (-2.6604, 40) -> (-11.3207, 25)
  line L10 (-103, 0) -> (-63, 0) construction
  line L11 (-63, 0) -> (-63, 40) construction
  line L12 (-63, 40) -> (-103, 40) construction
  line L13 (-103, 40) -> (-103, 0) construction
  circle A1 centre (-93, 10) radius 2.3 projected
  line L14 (40, 0) -> (0, 0) construction
  line L15 (0, 0) -> (0, 40) construction
  line L16 (0, 40) -> (40, 40) construction
  line L17 (40, 40) -> (40, 0) construction
  circle A2 centre (30, 30) radius 2.3 projected
  point P0 (0, 0)
  dimension "d283" = 40
  dimension "d284" = 10
  dimension "d285" = 15
  dimension "d286" = 40
  dimension "d287" = 40
  dimension "d288" = 10
  dimension "d289" = 40
  dimension "d290" = 40
  dimension "d291" = 10
extrude "Extrusion11" cut sketch "Sketch14" against normal through all contours L3 L2 L1 L0 | L9 L8 L7 L2
properties part number "_3DPrint"
